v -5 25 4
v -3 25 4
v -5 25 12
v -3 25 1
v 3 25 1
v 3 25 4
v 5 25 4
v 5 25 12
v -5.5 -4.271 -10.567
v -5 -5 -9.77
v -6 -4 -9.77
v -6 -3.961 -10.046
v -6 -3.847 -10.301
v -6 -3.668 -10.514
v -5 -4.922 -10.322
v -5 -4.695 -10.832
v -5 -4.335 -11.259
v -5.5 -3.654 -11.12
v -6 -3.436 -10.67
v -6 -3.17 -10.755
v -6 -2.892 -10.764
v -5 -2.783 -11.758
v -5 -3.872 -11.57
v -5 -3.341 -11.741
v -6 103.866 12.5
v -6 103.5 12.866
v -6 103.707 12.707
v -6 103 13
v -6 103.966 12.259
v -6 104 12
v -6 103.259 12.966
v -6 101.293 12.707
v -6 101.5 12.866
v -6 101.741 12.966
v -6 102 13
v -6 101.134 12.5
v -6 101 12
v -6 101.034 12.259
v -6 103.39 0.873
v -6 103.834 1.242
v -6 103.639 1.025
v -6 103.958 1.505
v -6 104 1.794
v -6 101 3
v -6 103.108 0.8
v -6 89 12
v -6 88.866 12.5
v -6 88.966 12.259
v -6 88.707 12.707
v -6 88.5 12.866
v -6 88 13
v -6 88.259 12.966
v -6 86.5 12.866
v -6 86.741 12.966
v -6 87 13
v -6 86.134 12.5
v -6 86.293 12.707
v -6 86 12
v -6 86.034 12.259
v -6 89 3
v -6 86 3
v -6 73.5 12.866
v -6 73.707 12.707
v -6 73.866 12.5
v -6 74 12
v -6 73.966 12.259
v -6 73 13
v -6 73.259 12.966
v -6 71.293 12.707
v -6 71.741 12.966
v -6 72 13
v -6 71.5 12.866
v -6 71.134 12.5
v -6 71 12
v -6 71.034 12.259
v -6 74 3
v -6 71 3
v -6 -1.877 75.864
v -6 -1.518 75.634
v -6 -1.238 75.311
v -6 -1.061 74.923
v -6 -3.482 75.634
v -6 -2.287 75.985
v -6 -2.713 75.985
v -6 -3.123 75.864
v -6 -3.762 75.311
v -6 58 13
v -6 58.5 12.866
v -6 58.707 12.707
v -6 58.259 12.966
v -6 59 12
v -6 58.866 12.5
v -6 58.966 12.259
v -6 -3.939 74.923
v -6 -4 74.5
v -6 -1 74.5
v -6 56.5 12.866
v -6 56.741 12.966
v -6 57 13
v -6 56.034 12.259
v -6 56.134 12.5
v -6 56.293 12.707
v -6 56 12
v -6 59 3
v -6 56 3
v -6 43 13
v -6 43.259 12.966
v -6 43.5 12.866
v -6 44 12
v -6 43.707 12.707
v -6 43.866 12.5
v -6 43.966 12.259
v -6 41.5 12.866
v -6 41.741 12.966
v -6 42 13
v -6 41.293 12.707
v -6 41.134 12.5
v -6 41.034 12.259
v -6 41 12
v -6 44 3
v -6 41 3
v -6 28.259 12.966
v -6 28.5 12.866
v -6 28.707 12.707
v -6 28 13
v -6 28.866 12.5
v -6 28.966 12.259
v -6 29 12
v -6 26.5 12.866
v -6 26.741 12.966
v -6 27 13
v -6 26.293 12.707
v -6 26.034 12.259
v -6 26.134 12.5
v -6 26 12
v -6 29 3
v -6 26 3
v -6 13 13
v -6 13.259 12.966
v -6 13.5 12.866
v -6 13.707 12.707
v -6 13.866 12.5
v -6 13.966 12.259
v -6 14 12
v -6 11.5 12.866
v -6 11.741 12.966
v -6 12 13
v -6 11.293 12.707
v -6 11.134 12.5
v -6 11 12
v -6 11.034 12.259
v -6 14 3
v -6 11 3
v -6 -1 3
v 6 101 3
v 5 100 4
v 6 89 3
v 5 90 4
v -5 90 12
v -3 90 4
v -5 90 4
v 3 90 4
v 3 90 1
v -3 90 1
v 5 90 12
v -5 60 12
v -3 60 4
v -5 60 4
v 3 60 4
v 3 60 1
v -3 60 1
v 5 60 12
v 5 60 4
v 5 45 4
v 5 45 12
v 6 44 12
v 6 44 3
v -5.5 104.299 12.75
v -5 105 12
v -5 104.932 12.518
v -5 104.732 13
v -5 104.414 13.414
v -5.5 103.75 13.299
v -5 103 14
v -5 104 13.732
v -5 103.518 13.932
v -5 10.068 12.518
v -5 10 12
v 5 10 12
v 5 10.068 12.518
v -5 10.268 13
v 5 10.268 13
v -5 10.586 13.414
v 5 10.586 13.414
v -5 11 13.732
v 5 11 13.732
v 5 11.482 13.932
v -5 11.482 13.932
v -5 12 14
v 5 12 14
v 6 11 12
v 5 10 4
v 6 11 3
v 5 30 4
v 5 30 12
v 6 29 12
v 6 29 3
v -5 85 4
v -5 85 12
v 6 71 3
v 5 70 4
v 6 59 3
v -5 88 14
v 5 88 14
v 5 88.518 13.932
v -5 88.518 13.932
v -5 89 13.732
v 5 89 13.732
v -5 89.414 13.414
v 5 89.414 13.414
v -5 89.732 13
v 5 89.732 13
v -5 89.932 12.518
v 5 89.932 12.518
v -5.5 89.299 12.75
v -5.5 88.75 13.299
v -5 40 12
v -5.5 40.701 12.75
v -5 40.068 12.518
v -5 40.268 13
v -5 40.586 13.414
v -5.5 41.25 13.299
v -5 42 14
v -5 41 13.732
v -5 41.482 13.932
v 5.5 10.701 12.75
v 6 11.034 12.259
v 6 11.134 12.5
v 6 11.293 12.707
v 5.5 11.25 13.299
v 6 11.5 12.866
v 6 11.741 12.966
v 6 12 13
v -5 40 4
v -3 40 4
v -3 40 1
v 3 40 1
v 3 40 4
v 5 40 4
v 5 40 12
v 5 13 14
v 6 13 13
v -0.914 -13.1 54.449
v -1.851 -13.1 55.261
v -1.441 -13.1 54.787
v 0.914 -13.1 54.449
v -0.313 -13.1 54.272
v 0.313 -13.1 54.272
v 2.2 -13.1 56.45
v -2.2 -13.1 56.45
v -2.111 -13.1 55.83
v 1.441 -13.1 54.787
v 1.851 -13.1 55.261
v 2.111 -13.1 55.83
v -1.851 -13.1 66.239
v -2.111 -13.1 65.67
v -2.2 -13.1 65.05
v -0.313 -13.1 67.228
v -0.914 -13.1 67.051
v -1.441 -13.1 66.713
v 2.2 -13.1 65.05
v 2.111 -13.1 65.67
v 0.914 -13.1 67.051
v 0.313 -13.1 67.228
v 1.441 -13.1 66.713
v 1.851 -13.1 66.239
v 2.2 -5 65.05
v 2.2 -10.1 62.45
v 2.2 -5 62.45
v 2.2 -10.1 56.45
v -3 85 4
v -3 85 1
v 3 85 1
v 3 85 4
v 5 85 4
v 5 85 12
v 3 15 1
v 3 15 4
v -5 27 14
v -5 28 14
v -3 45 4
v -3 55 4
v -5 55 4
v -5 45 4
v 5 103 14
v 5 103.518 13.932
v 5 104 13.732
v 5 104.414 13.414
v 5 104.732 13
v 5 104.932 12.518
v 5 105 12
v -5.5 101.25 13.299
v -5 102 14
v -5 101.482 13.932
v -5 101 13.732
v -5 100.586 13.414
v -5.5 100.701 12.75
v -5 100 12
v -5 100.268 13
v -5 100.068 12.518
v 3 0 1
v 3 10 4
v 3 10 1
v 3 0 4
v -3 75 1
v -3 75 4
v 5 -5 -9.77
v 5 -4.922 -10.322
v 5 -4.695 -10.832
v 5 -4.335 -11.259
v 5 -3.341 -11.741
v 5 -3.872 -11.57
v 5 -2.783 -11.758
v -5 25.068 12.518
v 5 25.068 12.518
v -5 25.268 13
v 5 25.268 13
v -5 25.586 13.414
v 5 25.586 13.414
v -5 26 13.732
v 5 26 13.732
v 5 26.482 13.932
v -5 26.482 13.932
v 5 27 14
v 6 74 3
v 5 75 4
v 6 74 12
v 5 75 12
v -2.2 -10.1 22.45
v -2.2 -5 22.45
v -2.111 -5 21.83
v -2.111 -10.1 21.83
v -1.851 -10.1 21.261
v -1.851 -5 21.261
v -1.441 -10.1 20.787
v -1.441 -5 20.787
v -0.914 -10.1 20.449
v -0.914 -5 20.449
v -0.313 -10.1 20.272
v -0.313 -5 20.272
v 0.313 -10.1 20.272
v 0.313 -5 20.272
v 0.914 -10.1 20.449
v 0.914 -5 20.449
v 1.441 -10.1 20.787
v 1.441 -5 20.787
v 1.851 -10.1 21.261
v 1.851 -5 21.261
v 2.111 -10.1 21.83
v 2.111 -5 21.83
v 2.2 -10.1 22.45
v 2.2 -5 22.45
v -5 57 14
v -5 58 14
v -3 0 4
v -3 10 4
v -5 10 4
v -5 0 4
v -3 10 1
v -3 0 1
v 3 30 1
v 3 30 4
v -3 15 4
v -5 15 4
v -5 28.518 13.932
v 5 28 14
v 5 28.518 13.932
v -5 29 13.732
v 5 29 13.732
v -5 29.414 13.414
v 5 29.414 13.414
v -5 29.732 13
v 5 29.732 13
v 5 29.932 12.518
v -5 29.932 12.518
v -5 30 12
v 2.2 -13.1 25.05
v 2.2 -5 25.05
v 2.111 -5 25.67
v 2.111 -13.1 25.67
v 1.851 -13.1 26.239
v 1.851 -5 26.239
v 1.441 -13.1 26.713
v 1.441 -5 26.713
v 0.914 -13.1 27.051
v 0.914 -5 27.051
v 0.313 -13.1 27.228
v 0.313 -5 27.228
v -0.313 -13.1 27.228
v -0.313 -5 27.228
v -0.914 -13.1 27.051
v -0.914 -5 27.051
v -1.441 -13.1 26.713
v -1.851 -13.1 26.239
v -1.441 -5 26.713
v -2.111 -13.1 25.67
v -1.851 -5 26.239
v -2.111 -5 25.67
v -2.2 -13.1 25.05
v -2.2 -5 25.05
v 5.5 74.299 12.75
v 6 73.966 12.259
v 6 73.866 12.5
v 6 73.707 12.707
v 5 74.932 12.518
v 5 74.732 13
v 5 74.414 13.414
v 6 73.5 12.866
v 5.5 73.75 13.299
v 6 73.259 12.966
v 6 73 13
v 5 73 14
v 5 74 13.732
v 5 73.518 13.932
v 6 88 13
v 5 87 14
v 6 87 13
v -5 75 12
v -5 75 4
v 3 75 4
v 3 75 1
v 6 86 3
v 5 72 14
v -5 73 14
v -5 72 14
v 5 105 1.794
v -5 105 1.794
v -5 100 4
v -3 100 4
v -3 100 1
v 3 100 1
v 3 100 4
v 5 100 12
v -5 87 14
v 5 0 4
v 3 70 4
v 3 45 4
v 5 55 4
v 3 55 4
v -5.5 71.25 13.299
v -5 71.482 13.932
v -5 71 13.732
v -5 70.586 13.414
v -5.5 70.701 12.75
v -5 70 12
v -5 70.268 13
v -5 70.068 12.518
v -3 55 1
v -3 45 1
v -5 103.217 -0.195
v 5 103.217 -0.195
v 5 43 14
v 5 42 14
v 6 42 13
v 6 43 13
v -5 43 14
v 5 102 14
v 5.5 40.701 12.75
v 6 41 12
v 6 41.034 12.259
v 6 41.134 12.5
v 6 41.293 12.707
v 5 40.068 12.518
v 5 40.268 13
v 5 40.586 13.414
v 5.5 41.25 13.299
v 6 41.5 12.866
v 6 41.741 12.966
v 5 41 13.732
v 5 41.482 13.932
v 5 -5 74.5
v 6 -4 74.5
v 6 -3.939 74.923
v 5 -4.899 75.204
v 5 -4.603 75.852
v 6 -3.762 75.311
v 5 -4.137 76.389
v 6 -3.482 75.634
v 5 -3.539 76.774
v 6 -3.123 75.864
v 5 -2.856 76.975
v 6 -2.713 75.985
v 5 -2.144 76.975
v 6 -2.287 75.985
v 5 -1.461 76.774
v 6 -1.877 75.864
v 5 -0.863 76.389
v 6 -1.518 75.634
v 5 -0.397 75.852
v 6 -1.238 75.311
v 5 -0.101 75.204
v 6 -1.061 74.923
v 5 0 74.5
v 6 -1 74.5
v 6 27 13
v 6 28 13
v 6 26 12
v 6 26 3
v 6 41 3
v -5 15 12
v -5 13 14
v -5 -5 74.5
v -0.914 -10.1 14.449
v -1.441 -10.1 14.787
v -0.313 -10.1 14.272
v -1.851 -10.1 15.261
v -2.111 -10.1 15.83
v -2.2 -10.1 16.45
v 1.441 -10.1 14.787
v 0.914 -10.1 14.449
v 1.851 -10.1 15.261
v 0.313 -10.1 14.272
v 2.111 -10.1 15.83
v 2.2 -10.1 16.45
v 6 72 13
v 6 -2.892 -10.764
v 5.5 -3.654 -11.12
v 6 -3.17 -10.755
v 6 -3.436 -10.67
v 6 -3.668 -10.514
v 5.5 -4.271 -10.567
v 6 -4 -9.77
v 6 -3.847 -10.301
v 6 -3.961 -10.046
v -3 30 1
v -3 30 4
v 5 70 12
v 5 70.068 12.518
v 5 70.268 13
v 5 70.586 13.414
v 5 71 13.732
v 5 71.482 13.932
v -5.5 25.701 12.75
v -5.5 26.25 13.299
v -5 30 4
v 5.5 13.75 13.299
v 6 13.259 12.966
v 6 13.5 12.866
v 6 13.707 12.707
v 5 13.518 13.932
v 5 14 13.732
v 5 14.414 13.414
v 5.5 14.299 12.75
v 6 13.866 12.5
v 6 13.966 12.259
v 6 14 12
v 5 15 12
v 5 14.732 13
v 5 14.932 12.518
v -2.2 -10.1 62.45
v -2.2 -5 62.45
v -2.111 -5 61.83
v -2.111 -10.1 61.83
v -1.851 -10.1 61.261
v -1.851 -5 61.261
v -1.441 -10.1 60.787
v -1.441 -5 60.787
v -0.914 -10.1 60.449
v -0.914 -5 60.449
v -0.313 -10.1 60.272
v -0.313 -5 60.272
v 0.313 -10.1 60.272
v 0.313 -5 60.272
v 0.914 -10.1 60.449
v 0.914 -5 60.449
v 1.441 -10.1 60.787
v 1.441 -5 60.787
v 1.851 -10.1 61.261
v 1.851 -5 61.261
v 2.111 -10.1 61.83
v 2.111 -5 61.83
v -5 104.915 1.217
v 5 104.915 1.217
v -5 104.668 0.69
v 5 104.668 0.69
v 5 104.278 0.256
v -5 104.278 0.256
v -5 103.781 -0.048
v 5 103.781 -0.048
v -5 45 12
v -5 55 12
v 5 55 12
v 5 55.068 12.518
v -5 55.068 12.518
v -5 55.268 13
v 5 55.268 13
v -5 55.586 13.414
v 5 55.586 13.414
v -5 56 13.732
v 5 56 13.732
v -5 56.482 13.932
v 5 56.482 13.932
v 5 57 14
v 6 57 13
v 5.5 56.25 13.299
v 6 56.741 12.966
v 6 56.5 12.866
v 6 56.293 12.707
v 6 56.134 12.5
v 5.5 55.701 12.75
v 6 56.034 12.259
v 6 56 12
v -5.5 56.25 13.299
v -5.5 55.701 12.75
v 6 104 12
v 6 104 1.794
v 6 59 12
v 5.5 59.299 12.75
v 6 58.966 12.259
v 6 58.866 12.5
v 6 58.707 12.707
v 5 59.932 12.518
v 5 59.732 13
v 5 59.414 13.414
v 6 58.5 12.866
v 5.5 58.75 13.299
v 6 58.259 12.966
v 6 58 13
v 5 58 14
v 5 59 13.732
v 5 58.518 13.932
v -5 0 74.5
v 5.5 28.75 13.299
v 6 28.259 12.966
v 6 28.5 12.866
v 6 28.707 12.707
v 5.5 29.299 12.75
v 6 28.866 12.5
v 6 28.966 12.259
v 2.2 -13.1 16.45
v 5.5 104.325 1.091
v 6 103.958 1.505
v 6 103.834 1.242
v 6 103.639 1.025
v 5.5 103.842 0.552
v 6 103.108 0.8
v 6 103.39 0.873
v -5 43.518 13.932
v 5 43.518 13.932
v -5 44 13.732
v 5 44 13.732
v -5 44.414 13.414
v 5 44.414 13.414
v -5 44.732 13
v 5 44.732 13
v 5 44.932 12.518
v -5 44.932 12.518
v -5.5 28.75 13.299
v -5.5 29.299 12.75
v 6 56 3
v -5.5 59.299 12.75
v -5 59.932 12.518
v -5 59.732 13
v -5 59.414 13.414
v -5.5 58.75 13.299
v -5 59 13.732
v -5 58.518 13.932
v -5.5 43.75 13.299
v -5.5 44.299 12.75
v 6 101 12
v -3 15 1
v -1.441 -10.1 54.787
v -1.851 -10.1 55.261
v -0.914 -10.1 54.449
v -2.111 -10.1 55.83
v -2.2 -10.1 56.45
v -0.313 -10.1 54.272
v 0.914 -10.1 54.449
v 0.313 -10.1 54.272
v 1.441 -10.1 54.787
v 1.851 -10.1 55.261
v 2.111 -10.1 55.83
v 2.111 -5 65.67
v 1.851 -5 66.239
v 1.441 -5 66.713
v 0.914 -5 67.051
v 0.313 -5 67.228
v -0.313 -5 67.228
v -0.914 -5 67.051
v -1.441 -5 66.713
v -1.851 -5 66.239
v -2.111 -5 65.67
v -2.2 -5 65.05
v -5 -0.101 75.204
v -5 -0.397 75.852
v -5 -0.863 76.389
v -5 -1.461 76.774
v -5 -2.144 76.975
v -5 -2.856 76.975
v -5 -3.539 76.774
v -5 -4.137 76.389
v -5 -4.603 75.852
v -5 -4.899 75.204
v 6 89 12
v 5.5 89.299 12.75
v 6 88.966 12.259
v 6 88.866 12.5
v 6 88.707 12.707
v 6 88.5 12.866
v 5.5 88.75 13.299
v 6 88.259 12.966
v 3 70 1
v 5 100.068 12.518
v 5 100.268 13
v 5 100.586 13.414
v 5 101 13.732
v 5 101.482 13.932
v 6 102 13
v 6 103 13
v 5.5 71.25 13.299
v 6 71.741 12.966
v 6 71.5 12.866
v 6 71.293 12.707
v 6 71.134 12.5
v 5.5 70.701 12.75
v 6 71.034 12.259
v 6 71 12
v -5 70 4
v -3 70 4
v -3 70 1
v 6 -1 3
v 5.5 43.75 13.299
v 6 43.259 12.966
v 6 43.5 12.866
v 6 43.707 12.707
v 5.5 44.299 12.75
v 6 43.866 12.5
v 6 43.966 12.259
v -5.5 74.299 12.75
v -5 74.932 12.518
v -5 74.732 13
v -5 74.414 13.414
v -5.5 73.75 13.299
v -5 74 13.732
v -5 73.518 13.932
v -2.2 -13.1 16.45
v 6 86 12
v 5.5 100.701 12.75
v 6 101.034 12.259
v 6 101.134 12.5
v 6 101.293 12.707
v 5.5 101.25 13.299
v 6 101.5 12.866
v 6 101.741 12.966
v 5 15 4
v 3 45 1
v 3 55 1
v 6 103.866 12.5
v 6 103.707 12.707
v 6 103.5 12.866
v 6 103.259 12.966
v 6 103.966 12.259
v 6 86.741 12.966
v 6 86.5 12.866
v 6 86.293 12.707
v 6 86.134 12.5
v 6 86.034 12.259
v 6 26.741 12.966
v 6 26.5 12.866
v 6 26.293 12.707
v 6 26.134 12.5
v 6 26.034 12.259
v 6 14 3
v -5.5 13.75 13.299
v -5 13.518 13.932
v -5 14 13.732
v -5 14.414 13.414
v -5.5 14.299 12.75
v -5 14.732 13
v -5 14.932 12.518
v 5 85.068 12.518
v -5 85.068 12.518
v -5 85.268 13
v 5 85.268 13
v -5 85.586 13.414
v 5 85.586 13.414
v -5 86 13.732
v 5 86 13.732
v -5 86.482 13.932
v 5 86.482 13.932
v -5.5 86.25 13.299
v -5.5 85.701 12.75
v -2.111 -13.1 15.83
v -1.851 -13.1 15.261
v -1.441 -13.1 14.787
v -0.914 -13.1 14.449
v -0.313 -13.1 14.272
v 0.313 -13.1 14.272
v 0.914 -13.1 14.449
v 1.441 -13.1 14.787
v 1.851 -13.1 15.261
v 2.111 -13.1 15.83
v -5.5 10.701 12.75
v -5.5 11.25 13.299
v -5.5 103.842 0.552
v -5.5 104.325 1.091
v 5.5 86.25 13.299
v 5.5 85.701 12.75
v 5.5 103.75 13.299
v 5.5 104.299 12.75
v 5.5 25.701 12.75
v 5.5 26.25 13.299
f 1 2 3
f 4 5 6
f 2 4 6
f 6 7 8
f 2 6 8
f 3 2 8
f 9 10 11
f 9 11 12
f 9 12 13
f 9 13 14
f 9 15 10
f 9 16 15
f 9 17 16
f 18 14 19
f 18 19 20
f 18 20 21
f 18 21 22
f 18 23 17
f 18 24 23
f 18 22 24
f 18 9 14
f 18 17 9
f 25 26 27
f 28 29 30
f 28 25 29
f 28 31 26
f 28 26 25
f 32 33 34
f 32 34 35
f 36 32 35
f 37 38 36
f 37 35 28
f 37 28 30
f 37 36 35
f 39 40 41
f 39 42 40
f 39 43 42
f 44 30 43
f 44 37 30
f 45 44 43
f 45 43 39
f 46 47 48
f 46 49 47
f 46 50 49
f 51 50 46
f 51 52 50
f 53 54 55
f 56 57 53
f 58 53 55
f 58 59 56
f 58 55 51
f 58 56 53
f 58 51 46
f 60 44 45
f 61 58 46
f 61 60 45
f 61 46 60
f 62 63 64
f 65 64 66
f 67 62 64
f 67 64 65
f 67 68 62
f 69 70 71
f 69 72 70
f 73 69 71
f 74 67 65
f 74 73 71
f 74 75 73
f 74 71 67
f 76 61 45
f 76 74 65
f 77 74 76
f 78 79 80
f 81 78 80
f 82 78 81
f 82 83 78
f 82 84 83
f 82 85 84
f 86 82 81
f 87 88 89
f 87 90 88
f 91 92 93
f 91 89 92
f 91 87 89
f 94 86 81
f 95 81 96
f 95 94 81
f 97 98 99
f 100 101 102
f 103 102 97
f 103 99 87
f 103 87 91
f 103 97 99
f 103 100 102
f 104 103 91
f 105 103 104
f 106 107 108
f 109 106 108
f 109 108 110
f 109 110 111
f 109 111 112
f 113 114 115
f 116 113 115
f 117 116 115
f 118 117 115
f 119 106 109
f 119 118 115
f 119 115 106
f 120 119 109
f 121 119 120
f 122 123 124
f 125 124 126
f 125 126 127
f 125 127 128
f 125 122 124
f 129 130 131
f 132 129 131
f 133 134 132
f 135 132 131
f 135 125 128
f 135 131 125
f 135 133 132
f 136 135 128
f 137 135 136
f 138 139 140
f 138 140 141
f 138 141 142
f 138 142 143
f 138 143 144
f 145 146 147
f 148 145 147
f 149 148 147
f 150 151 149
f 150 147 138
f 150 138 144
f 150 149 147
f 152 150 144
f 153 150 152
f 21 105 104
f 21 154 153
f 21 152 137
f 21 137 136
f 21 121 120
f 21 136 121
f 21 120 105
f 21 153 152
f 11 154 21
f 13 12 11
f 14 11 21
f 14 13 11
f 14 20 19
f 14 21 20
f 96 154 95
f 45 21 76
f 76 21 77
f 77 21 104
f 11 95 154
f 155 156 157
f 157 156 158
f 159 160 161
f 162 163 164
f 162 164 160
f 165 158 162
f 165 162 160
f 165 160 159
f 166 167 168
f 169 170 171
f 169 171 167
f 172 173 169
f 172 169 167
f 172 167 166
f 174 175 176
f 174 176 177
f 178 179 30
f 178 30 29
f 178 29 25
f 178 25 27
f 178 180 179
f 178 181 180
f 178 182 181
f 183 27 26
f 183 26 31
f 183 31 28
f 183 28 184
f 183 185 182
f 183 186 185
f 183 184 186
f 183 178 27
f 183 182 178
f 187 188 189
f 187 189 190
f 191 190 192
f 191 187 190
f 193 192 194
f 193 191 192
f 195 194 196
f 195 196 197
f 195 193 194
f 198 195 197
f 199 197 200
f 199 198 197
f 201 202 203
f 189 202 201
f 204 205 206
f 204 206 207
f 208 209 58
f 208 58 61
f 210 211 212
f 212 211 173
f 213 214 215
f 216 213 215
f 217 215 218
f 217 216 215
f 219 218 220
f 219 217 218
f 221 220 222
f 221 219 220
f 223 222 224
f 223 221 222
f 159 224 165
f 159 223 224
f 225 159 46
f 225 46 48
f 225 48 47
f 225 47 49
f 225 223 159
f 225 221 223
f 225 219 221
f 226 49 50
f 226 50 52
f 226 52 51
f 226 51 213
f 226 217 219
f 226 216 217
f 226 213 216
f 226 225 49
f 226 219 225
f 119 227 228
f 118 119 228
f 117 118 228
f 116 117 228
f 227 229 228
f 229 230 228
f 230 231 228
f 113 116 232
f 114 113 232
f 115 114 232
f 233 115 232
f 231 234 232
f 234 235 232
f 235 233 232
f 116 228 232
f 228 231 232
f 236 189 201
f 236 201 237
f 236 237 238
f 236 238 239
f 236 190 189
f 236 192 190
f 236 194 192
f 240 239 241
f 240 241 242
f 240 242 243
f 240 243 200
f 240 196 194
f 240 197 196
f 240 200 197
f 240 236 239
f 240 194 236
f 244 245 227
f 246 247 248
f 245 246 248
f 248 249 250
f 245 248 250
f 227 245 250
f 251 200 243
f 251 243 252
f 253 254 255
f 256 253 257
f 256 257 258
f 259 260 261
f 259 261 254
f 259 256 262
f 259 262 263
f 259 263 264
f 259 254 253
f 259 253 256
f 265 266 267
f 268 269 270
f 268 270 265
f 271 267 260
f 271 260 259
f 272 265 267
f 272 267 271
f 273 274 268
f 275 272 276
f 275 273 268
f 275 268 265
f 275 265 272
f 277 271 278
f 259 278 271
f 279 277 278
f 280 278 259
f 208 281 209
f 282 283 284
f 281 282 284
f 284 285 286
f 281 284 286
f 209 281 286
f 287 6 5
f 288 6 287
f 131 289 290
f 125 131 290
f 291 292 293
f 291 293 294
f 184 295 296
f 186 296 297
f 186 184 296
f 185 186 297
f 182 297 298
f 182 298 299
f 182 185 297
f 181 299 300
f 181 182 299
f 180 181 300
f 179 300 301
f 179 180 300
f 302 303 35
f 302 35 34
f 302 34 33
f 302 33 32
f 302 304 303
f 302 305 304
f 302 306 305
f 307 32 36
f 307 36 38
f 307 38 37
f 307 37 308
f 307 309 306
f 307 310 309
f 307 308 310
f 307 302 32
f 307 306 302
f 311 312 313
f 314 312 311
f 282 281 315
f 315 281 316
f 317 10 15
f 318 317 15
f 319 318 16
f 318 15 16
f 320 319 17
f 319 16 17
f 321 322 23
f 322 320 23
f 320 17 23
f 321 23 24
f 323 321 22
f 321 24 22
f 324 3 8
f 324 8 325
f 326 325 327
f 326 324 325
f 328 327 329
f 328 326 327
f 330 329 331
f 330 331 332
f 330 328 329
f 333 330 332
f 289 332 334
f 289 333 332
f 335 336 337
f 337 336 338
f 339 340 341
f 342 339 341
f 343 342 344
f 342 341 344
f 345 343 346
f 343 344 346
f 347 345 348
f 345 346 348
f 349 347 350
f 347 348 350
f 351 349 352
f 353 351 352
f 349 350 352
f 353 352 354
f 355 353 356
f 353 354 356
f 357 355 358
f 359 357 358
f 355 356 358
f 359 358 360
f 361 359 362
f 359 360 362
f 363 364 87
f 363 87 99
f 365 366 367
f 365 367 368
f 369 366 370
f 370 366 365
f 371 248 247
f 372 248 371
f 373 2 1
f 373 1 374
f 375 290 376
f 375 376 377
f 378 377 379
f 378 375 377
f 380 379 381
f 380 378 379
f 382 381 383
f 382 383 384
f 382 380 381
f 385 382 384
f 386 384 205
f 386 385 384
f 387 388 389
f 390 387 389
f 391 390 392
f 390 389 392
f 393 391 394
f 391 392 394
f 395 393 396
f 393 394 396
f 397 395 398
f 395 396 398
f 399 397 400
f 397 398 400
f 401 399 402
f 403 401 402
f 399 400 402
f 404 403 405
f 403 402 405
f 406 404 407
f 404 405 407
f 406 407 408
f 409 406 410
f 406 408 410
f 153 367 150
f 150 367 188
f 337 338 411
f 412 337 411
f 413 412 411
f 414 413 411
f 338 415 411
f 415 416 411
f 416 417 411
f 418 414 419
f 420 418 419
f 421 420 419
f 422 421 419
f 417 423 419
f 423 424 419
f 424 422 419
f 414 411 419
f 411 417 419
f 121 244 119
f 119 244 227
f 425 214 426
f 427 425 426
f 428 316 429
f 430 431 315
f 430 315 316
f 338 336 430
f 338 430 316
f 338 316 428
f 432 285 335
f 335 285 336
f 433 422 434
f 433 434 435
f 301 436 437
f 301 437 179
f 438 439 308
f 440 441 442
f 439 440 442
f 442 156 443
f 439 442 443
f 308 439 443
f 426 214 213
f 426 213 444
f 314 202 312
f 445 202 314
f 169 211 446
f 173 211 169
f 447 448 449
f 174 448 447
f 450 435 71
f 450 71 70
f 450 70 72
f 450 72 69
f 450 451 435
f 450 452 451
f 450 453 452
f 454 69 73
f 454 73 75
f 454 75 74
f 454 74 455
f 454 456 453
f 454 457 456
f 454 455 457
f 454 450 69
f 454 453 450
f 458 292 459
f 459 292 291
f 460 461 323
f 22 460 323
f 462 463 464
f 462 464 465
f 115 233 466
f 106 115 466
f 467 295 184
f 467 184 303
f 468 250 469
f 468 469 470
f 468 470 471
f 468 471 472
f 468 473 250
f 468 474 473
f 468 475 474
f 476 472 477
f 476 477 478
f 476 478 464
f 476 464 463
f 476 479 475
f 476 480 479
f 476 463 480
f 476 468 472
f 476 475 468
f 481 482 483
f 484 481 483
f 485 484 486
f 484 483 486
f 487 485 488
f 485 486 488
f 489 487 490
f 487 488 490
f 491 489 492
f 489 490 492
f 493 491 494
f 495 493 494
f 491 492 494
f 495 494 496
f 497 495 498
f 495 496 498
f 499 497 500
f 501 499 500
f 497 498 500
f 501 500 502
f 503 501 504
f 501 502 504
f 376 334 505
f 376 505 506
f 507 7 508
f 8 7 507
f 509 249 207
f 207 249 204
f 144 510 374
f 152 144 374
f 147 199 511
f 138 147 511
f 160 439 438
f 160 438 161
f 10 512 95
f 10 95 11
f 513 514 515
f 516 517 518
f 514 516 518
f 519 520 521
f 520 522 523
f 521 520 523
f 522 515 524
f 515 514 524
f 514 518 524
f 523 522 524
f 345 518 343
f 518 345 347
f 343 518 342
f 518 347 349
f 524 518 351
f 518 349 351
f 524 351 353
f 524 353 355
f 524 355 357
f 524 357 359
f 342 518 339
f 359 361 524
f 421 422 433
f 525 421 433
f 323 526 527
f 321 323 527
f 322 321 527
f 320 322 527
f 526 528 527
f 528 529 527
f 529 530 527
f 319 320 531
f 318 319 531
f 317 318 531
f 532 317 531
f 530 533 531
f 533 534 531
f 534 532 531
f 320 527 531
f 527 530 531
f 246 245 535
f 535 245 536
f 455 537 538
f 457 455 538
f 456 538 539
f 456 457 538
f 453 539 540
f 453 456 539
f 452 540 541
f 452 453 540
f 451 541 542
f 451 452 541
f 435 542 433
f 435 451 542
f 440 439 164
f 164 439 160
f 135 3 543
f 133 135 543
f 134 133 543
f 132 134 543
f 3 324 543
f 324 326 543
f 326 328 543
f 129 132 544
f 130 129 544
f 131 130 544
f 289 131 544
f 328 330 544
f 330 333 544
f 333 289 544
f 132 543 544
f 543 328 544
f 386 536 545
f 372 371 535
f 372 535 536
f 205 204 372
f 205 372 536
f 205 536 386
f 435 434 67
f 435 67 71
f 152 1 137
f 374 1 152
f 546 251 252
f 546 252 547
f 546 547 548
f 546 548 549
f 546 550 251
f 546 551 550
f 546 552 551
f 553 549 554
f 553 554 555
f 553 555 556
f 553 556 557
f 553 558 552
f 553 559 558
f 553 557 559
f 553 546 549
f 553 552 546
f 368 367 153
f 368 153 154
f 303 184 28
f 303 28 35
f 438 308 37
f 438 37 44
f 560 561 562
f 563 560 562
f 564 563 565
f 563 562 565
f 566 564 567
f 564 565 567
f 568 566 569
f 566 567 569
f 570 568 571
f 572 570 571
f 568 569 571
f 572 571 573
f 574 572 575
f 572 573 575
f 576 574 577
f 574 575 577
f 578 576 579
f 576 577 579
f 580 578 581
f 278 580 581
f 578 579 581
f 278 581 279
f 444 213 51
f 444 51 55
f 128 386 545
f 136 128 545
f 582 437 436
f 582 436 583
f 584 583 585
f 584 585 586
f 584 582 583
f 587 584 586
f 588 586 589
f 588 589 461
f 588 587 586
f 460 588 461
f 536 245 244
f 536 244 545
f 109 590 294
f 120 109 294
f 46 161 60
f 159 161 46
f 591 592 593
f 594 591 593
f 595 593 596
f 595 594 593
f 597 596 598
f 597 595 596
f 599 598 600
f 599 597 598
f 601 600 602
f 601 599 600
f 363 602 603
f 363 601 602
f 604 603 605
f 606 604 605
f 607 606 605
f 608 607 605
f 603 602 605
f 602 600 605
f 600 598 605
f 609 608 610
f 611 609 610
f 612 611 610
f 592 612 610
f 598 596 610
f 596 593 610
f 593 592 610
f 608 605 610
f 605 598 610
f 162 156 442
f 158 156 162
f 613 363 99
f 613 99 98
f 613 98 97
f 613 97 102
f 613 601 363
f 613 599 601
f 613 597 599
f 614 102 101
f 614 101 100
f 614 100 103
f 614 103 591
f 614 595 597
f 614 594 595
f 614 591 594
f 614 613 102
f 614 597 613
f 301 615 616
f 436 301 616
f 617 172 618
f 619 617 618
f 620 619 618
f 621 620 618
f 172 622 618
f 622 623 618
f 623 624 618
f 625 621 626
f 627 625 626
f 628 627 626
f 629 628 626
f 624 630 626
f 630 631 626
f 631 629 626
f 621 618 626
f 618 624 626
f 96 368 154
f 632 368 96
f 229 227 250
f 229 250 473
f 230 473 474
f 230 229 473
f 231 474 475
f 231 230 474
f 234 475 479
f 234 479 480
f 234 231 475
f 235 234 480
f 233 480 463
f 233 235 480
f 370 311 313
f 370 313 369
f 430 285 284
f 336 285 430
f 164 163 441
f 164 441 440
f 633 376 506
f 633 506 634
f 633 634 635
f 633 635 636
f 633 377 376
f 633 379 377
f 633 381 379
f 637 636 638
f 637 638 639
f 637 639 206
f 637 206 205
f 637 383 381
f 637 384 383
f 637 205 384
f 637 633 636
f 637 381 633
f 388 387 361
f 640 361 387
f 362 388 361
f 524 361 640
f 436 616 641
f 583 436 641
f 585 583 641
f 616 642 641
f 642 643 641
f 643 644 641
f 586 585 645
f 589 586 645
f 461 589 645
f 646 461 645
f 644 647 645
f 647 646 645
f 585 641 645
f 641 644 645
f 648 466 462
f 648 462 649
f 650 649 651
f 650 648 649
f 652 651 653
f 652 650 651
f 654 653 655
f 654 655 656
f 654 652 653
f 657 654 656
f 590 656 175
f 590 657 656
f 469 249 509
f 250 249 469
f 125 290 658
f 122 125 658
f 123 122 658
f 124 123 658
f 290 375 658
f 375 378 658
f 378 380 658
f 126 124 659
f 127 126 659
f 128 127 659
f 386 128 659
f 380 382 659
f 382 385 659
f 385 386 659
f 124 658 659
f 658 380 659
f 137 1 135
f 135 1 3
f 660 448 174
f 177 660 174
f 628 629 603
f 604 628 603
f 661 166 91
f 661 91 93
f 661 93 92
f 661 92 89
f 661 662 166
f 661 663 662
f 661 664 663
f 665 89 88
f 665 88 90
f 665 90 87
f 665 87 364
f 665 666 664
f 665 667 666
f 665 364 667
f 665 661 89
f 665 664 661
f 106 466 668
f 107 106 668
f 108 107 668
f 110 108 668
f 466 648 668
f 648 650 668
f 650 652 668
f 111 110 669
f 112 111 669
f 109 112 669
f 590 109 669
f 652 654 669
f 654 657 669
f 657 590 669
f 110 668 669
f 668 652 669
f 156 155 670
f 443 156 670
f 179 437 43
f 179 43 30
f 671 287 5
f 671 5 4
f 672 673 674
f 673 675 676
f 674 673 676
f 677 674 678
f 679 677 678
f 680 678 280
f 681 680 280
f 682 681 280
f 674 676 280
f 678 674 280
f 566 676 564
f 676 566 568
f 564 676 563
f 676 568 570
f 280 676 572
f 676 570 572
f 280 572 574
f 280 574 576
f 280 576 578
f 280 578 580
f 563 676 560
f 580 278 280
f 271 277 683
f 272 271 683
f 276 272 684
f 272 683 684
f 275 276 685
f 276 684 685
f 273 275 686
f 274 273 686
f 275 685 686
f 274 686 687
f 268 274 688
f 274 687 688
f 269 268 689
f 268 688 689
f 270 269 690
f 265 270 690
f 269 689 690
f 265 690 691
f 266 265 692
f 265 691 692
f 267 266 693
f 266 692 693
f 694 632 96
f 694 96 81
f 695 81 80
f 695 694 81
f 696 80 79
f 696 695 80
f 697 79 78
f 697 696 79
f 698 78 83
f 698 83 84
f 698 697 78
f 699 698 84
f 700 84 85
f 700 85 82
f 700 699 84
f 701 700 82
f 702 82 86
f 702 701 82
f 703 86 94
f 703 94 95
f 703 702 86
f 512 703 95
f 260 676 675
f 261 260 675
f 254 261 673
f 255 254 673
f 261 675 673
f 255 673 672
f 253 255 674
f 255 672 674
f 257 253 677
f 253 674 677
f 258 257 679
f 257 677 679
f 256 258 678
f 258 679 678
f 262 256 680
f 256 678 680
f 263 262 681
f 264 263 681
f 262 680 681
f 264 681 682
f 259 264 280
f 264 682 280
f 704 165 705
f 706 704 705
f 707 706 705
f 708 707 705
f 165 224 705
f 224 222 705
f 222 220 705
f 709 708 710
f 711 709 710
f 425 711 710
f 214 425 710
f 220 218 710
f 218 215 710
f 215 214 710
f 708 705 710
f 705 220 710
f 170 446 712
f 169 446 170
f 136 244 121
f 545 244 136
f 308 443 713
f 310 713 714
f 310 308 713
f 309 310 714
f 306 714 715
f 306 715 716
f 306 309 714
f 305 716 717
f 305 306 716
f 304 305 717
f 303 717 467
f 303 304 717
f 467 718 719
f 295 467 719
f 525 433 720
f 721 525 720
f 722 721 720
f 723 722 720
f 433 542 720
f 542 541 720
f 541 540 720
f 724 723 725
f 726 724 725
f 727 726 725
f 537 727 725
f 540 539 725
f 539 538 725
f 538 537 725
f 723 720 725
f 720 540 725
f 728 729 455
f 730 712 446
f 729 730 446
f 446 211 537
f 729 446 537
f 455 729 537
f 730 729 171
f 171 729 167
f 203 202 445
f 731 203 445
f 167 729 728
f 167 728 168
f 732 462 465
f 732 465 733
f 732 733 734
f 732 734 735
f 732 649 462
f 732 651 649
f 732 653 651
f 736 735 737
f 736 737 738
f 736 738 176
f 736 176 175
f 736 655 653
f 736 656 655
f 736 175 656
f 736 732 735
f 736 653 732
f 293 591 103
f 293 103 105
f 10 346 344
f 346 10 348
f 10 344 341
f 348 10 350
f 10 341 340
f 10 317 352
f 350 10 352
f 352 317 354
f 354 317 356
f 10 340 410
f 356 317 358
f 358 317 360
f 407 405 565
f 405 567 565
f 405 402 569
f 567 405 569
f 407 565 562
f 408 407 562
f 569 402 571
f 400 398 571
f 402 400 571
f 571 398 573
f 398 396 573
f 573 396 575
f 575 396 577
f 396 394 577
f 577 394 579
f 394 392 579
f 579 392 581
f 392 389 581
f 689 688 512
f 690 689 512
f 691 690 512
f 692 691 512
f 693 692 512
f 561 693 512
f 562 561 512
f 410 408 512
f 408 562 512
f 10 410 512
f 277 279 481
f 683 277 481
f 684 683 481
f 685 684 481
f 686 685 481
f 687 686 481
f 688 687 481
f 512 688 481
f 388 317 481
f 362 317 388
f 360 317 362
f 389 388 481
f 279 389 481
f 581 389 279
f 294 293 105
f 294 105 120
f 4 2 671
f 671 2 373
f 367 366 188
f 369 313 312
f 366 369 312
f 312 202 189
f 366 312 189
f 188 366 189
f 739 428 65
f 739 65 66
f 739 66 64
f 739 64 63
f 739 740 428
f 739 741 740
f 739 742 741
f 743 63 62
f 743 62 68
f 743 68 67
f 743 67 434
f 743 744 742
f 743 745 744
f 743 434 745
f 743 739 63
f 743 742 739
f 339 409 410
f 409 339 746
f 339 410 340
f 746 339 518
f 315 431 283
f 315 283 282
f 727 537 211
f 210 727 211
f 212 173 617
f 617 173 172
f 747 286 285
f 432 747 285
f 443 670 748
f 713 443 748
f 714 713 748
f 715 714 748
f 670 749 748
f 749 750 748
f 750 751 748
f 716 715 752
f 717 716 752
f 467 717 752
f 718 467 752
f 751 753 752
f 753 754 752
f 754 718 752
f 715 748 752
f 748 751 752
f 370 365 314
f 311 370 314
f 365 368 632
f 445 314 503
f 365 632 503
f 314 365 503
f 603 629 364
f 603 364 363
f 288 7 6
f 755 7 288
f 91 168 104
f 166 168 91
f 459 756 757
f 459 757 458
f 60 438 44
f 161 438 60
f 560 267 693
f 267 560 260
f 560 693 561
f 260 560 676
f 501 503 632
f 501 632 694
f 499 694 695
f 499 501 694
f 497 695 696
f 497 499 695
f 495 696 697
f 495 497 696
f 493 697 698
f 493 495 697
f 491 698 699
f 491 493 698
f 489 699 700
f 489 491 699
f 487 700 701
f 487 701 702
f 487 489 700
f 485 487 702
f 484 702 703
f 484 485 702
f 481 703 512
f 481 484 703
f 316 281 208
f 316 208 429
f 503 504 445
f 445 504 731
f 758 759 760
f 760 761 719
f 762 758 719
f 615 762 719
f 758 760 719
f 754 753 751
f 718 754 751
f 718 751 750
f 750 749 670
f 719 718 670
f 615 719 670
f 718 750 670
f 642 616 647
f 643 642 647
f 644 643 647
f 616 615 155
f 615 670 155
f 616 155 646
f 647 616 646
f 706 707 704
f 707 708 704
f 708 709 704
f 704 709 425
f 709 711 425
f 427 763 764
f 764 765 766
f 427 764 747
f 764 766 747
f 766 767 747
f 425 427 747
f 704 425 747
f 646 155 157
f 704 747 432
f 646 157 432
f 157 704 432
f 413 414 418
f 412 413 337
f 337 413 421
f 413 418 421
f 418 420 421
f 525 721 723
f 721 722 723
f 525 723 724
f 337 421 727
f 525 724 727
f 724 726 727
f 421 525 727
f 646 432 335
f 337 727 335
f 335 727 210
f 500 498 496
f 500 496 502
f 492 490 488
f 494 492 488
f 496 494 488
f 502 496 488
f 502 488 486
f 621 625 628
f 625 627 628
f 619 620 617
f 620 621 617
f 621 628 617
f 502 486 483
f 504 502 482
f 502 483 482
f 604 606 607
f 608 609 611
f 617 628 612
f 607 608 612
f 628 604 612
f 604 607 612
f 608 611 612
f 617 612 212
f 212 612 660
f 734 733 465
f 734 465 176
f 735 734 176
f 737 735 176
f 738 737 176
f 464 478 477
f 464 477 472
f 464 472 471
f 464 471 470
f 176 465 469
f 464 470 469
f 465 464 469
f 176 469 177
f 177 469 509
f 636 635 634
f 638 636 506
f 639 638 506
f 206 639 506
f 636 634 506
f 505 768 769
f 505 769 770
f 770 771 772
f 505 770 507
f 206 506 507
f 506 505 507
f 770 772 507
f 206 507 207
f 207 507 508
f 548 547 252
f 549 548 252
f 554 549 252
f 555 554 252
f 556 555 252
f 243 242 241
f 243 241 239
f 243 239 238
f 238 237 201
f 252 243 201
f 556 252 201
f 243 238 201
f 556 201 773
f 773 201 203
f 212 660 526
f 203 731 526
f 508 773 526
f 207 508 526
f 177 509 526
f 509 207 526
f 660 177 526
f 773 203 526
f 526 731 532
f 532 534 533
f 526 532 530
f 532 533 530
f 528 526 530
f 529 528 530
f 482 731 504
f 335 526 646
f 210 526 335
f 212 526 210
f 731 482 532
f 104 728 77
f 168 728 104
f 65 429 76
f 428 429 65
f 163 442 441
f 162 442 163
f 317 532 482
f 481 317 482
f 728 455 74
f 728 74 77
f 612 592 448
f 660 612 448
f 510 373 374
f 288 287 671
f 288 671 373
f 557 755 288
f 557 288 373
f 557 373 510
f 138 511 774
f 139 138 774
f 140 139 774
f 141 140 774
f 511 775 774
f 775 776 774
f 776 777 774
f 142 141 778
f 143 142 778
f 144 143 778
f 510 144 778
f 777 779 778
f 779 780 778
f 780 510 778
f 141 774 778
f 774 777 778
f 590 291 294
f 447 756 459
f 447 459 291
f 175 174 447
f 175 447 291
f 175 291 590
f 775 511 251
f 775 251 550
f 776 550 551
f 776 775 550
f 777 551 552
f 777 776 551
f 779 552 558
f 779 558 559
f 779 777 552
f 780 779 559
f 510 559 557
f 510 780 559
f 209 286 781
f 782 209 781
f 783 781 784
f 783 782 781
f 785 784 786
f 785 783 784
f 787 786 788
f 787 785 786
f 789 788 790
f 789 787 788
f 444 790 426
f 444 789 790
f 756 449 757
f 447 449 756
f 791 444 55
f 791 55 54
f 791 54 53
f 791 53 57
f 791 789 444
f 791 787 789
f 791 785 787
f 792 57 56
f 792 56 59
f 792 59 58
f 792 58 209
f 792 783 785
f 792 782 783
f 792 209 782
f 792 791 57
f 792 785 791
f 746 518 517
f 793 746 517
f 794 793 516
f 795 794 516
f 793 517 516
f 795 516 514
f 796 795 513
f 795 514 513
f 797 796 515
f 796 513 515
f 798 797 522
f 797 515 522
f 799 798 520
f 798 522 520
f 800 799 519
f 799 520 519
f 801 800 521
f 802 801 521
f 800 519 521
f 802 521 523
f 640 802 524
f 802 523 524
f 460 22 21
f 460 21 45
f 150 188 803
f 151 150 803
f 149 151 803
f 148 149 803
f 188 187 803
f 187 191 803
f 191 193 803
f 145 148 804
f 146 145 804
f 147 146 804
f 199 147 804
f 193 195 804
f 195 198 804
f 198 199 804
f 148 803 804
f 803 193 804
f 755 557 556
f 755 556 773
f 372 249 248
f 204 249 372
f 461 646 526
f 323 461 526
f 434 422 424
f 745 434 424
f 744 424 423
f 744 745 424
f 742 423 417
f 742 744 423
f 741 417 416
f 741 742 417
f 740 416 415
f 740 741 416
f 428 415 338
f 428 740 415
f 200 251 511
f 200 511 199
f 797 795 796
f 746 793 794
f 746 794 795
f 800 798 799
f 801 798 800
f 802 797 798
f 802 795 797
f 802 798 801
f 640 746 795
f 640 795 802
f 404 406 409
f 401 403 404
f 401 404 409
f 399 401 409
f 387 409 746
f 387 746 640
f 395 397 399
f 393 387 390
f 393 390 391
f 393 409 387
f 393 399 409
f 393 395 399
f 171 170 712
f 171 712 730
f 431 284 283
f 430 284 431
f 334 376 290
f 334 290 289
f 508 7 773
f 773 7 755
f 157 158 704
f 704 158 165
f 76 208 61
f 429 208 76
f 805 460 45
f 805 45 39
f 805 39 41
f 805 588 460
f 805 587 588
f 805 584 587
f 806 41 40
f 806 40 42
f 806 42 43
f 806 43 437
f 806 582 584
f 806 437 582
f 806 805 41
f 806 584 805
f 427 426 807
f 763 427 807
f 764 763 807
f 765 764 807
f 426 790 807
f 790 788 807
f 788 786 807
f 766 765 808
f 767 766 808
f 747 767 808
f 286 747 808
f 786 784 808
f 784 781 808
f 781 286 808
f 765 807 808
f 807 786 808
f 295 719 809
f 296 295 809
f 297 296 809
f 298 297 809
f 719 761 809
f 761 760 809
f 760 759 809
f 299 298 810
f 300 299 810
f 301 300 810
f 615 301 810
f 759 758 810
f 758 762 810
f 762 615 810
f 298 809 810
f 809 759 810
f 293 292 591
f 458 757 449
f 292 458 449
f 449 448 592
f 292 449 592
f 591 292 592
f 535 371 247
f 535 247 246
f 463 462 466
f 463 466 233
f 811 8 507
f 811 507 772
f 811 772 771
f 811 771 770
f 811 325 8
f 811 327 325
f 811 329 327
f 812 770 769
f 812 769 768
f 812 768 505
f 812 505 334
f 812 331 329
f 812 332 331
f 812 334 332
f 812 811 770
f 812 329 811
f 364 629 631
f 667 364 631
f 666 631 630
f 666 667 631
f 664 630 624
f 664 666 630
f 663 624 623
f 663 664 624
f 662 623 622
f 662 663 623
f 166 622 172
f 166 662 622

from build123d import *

# Parameters (mm, degrees)
SKETCH_W        = 12
SKETCH_H        = 77
PAD_DEPTH       = 5
PAD001_DEPTH    = 5.1
PAD002_DEPTH    = 3
SKETCH003_W     = 4
SKETCH003_H     = 105
SKETCH003_W_2   = 10
SKETCH003_H_2   = 5
PAD003_DEPTH    = 12
SKETCH004_W     = 6
SKETCH004_H     = 10
POCKET_DEPTH    = 3
POCKET001_DEPTH = 12.001
FILLET_R        = 2
PAD004_DEPTH    = 12
FILLET001_R     = 2
CHAMFER_SIZE    = 1


with BuildPart() as part:
    # Sketch → Pad (new body)
    with BuildSketch(Plane.XZ):
        with Locations((0, 38.5)):
            Rectangle(SKETCH_W, SKETCH_H)
    extrude(amount=PAD_DEPTH)

    # Sketch001 (on Face6 of Pad) → Pad001 (join)
    with BuildSketch(Plane.XZ.offset(5)):
        with BuildLine():
            Line((-2.2, 25.05), (-2.2, 22.45))
            ThreePointArc((-2.2, 22.45), (0, 20.25), (2.2, 22.45))
            Line((2.2, 25.05), (2.2, 22.45))
            ThreePointArc((2.2, 25.05), (0, 27.25), (-2.2, 25.05))
        make_face()
        with BuildLine():
            Line((-2.2, 65.05), (-2.2, 62.45))
            ThreePointArc((-2.2, 62.45), (0, 60.25), (2.2, 62.45))
            Line((2.2, 65.05), (2.2, 62.45))
            ThreePointArc((2.2, 65.05), (0, 67.25), (-2.2, 65.05))
        make_face()
    extrude(amount=PAD001_DEPTH)

    # Sketch002 (on Face16 of Pad001) → Pad002 (join)
    with BuildSketch(Plane.XZ.offset(10.1)):
        with BuildLine():
            Line((-2.2, 25.05), (-2.2, 16.45))
            ThreePointArc((-2.2, 16.45), (0, 14.25), (2.2, 16.45))
            Line((2.2, 25.05), (2.2, 16.45))
            ThreePointArc((2.2, 25.05), (0, 27.25), (-2.2, 25.05))
        make_face()
        with BuildLine():
            Line((-2.2, 65.05), (-2.2, 56.45))
            ThreePointArc((-2.2, 56.45), (0, 54.25), (2.2, 56.45))
            Line((2.2, 65.05), (2.2, 56.45))
            ThreePointArc((2.2, 65.05), (0, 67.25), (-2.2, 65.05))
        make_face()
    extrude(amount=PAD002_DEPTH)

    # Sketch003 (on Face6 of Pad002) → Pad003 (join)
    with BuildSketch(Plane(origin=(6, 0, 0), x_dir=(0, 0, 1), z_dir=(1, 0, 0))):
        with Locations((2, -52.5)):
            Rectangle(SKETCH003_W, SKETCH003_H)
        with Locations((9, -12.5)):
            Rectangle(SKETCH003_W_2, SKETCH003_H_2)
        with Locations((9, -27.5)):
            Rectangle(SKETCH003_W_2, SKETCH003_H_2)
        with Locations((9, -42.5)):
            Rectangle(SKETCH003_W_2, SKETCH003_H_2)
        with Locations((9, -57.5)):
            Rectangle(SKETCH003_W_2, SKETCH003_H_2)
        with Locations((9, -72.5)):
            Rectangle(SKETCH003_W_2, SKETCH003_H_2)
        with Locations((9, -87.5)):
            Rectangle(SKETCH003_W_2, SKETCH003_H_2)
        with Locations((9, -102.5)):
            Rectangle(SKETCH003_W_2, SKETCH003_H_2)
    extrude(amount=-PAD003_DEPTH)

    # Sketch004 (on Face30 of Pad003) → Pocket (cut)
    with BuildSketch(Plane(origin=(0, 0, 4), x_dir=(-1, 0, 0), z_dir=(0, 0, 1))):
        with Locations((0, -5)):
            Rectangle(SKETCH004_W, SKETCH004_H)
        with Locations((0, -20)):
            Rectangle(SKETCH004_W, SKETCH004_H)
        with Locations((0, -35)):
            Rectangle(SKETCH004_W, SKETCH004_H)
        with Locations((0, -50)):
            Rectangle(SKETCH004_W, SKETCH004_H)
        with Locations((0, -65)):
            Rectangle(SKETCH004_W, SKETCH004_H)
        with Locations((0, -80)):
            Rectangle(SKETCH004_W, SKETCH004_H)
        with Locations((0, -95)):
            Rectangle(SKETCH004_W, SKETCH004_H)
    extrude(amount=-POCKET_DEPTH, mode=Mode.SUBTRACT)

    # Sketch005 (on Face5 of Pocket) → Pocket001 (cut, through all)
    with BuildSketch(Plane(origin=(6, 0, 0), x_dir=(0, 0, 1), z_dir=(1, 0, 0))):
        with BuildLine():
            ThreePointArc((74.499999, 0), (77, 2.5), (74.5, 5))
            Line((74.5, 5), (77.1, 5))
            Line((77.1, 5), (77.099999, 0))
            Line((74.499999, 0), (77.099999, 0))
        make_face()
    extrude(amount=-POCKET001_DEPTH, mode=Mode.SUBTRACT)

    # Fillet
    fillet_edges = [part.edges().sort_by_distance(p)[0] for p in [
        (0, 105, 14),
        (0, 100, 14),
        (0, 90, 14),
        (0, 85, 14),
        (0, 75, 14),
        (0, 70, 14),
        (0, 60, 14),
        (0, 55, 14),
        (0, 45, 14),
        (0, 40, 14),
        (0, 30, 14),
        (0, 25, 14),
        (0, 15, 14),
        (0, 10, 14),
    ]]
    fillet(fillet_edges, radius=FILLET_R)

    # Sketch006 (on Face5 of Fillet) → Pad004 (join)
    with BuildSketch(Plane(origin=(6, 0, 0), x_dir=(0, 0, 1), z_dir=(1, 0, 0))):
        Polygon((-12, 5), (0, 5), (0, -105), align=None)
    extrude(amount=-PAD004_DEPTH)

    # Fillet001
    fillet001_edges = [part.edges().sort_by_distance(p)[0] for p in [
        (0, 105, 0),
        (0, -5, -12),
    ]]
    fillet(fillet001_edges, radius=FILLET001_R)

    # Chamfer
    chamfer_edges = [part.edges().sort_by_distance(p)[0] for p in [
        (6, -5, 32.365024),
        (6, -4.33533, -11.258877),
        (6, -4.267767, 76.267767),
        (6, 50.216895, -5.976339),
        (6, -0.732233, 76.267767),
        (6, 104.488924, 0.458354),
        (6, 0, 39.25),
        (6, 105, 6.896842),
        (6, 5, 4),
        (6, 104.414214, 13.414214),
        (6, 10, 8),
        (6, 102.5, 14),
        (6, 10.585786, 13.414214),
        (6, 100.585786, 13.414214),
        (6, 12.5, 14),
        (6, 100, 8),
        (6, 14.414214, 13.414214),
        (6, 95, 4),
        (6, 15, 8),
        (6, 90, 8),
        (6, 20, 4),
        (6, 89.414214, 13.414214),
        (6, 25, 8),
        (6, 87.5, 14),
        (6, 25.585786, 13.414214),
        (6, 85.585786, 13.414214),
        (6, 27.5, 14),
        (6, 85, 8),
        (6, 29.414214, 13.414214),
        (6, 80, 4),
        (6, 30, 8),
        (6, 75, 8),
        (6, 35, 4),
        (6, 74.414214, 13.414214),
        (6, 40, 8),
        (6, 72.5, 14),
        (6, 40.585786, 13.414214),
        (6, 70.585786, 13.414214),
        (6, 42.5, 14),
        (6, 70, 8),
        (6, 44.414214, 13.414214),
        (6, 65, 4),
        (6, 45, 8),
        (6, 60, 8),
        (6, 50, 4),
        (6, 59.414214, 13.414214),
        (6, 55, 8),
        (6, 57.5, 14),
        (6, 55.585786, 13.414214),
        (-6, 105, 6.896842),
        (-6, 104.488924, 0.458354),
        (-6, 104.414214, 13.414214),
        (-6, 50.216895, -5.976339),
        (-6, 102.5, 14),
        (-6, -4.33533, -11.258877),
        (-6, 100.585786, 13.414214),
        (-6, -5, 32.365024),
        (-6, 100, 8),
        (-6, -4.267767, 76.267767),
        (-6, 95, 4),
        (-6, -0.732233, 76.267767),
        (-6, 90, 8),
        (-6, 0, 39.25),
        (-6, 89.414214, 13.414214),
        (-6, 5, 4),
        (-6, 87.5, 14),
        (-6, 10, 8),
        (-6, 85.585786, 13.414214),
        (-6, 10.585786, 13.414214),
        (-6, 85, 8),
        (-6, 12.5, 14),
        (-6, 80, 4),
        (-6, 14.414214, 13.414214),
        (-6, 75, 8),
        (-6, 15, 8),
        (-6, 74.414214, 13.414214),
        (-6, 20, 4),
        (-6, 72.5, 14),
        (-6, 25, 8),
        (-6, 70.585786, 13.414214),
        (-6, 25.585786, 13.414214),
        (-6, 70, 8),
        (-6, 27.5, 14),
        (-6, 65, 4),
        (-6, 29.414214, 13.414214),
        (-6, 60, 8),
        (-6, 30, 8),
        (-6, 59.414214, 13.414214),
        (-6, 35, 4),
        (-6, 57.5, 14),
        (-6, 40, 8),
        (-6, 55.585786, 13.414214),
        (-6, 40.585786, 13.414214),
        (-6, 55, 8),
        (-6, 42.5, 14),
        (-6, 50, 4),
        (-6, 44.414214, 13.414214),
        (-6, 45, 8),
    ]]
    chamfer(chamfer_edges, length=CHAMFER_SIZE)


solid = part.part
